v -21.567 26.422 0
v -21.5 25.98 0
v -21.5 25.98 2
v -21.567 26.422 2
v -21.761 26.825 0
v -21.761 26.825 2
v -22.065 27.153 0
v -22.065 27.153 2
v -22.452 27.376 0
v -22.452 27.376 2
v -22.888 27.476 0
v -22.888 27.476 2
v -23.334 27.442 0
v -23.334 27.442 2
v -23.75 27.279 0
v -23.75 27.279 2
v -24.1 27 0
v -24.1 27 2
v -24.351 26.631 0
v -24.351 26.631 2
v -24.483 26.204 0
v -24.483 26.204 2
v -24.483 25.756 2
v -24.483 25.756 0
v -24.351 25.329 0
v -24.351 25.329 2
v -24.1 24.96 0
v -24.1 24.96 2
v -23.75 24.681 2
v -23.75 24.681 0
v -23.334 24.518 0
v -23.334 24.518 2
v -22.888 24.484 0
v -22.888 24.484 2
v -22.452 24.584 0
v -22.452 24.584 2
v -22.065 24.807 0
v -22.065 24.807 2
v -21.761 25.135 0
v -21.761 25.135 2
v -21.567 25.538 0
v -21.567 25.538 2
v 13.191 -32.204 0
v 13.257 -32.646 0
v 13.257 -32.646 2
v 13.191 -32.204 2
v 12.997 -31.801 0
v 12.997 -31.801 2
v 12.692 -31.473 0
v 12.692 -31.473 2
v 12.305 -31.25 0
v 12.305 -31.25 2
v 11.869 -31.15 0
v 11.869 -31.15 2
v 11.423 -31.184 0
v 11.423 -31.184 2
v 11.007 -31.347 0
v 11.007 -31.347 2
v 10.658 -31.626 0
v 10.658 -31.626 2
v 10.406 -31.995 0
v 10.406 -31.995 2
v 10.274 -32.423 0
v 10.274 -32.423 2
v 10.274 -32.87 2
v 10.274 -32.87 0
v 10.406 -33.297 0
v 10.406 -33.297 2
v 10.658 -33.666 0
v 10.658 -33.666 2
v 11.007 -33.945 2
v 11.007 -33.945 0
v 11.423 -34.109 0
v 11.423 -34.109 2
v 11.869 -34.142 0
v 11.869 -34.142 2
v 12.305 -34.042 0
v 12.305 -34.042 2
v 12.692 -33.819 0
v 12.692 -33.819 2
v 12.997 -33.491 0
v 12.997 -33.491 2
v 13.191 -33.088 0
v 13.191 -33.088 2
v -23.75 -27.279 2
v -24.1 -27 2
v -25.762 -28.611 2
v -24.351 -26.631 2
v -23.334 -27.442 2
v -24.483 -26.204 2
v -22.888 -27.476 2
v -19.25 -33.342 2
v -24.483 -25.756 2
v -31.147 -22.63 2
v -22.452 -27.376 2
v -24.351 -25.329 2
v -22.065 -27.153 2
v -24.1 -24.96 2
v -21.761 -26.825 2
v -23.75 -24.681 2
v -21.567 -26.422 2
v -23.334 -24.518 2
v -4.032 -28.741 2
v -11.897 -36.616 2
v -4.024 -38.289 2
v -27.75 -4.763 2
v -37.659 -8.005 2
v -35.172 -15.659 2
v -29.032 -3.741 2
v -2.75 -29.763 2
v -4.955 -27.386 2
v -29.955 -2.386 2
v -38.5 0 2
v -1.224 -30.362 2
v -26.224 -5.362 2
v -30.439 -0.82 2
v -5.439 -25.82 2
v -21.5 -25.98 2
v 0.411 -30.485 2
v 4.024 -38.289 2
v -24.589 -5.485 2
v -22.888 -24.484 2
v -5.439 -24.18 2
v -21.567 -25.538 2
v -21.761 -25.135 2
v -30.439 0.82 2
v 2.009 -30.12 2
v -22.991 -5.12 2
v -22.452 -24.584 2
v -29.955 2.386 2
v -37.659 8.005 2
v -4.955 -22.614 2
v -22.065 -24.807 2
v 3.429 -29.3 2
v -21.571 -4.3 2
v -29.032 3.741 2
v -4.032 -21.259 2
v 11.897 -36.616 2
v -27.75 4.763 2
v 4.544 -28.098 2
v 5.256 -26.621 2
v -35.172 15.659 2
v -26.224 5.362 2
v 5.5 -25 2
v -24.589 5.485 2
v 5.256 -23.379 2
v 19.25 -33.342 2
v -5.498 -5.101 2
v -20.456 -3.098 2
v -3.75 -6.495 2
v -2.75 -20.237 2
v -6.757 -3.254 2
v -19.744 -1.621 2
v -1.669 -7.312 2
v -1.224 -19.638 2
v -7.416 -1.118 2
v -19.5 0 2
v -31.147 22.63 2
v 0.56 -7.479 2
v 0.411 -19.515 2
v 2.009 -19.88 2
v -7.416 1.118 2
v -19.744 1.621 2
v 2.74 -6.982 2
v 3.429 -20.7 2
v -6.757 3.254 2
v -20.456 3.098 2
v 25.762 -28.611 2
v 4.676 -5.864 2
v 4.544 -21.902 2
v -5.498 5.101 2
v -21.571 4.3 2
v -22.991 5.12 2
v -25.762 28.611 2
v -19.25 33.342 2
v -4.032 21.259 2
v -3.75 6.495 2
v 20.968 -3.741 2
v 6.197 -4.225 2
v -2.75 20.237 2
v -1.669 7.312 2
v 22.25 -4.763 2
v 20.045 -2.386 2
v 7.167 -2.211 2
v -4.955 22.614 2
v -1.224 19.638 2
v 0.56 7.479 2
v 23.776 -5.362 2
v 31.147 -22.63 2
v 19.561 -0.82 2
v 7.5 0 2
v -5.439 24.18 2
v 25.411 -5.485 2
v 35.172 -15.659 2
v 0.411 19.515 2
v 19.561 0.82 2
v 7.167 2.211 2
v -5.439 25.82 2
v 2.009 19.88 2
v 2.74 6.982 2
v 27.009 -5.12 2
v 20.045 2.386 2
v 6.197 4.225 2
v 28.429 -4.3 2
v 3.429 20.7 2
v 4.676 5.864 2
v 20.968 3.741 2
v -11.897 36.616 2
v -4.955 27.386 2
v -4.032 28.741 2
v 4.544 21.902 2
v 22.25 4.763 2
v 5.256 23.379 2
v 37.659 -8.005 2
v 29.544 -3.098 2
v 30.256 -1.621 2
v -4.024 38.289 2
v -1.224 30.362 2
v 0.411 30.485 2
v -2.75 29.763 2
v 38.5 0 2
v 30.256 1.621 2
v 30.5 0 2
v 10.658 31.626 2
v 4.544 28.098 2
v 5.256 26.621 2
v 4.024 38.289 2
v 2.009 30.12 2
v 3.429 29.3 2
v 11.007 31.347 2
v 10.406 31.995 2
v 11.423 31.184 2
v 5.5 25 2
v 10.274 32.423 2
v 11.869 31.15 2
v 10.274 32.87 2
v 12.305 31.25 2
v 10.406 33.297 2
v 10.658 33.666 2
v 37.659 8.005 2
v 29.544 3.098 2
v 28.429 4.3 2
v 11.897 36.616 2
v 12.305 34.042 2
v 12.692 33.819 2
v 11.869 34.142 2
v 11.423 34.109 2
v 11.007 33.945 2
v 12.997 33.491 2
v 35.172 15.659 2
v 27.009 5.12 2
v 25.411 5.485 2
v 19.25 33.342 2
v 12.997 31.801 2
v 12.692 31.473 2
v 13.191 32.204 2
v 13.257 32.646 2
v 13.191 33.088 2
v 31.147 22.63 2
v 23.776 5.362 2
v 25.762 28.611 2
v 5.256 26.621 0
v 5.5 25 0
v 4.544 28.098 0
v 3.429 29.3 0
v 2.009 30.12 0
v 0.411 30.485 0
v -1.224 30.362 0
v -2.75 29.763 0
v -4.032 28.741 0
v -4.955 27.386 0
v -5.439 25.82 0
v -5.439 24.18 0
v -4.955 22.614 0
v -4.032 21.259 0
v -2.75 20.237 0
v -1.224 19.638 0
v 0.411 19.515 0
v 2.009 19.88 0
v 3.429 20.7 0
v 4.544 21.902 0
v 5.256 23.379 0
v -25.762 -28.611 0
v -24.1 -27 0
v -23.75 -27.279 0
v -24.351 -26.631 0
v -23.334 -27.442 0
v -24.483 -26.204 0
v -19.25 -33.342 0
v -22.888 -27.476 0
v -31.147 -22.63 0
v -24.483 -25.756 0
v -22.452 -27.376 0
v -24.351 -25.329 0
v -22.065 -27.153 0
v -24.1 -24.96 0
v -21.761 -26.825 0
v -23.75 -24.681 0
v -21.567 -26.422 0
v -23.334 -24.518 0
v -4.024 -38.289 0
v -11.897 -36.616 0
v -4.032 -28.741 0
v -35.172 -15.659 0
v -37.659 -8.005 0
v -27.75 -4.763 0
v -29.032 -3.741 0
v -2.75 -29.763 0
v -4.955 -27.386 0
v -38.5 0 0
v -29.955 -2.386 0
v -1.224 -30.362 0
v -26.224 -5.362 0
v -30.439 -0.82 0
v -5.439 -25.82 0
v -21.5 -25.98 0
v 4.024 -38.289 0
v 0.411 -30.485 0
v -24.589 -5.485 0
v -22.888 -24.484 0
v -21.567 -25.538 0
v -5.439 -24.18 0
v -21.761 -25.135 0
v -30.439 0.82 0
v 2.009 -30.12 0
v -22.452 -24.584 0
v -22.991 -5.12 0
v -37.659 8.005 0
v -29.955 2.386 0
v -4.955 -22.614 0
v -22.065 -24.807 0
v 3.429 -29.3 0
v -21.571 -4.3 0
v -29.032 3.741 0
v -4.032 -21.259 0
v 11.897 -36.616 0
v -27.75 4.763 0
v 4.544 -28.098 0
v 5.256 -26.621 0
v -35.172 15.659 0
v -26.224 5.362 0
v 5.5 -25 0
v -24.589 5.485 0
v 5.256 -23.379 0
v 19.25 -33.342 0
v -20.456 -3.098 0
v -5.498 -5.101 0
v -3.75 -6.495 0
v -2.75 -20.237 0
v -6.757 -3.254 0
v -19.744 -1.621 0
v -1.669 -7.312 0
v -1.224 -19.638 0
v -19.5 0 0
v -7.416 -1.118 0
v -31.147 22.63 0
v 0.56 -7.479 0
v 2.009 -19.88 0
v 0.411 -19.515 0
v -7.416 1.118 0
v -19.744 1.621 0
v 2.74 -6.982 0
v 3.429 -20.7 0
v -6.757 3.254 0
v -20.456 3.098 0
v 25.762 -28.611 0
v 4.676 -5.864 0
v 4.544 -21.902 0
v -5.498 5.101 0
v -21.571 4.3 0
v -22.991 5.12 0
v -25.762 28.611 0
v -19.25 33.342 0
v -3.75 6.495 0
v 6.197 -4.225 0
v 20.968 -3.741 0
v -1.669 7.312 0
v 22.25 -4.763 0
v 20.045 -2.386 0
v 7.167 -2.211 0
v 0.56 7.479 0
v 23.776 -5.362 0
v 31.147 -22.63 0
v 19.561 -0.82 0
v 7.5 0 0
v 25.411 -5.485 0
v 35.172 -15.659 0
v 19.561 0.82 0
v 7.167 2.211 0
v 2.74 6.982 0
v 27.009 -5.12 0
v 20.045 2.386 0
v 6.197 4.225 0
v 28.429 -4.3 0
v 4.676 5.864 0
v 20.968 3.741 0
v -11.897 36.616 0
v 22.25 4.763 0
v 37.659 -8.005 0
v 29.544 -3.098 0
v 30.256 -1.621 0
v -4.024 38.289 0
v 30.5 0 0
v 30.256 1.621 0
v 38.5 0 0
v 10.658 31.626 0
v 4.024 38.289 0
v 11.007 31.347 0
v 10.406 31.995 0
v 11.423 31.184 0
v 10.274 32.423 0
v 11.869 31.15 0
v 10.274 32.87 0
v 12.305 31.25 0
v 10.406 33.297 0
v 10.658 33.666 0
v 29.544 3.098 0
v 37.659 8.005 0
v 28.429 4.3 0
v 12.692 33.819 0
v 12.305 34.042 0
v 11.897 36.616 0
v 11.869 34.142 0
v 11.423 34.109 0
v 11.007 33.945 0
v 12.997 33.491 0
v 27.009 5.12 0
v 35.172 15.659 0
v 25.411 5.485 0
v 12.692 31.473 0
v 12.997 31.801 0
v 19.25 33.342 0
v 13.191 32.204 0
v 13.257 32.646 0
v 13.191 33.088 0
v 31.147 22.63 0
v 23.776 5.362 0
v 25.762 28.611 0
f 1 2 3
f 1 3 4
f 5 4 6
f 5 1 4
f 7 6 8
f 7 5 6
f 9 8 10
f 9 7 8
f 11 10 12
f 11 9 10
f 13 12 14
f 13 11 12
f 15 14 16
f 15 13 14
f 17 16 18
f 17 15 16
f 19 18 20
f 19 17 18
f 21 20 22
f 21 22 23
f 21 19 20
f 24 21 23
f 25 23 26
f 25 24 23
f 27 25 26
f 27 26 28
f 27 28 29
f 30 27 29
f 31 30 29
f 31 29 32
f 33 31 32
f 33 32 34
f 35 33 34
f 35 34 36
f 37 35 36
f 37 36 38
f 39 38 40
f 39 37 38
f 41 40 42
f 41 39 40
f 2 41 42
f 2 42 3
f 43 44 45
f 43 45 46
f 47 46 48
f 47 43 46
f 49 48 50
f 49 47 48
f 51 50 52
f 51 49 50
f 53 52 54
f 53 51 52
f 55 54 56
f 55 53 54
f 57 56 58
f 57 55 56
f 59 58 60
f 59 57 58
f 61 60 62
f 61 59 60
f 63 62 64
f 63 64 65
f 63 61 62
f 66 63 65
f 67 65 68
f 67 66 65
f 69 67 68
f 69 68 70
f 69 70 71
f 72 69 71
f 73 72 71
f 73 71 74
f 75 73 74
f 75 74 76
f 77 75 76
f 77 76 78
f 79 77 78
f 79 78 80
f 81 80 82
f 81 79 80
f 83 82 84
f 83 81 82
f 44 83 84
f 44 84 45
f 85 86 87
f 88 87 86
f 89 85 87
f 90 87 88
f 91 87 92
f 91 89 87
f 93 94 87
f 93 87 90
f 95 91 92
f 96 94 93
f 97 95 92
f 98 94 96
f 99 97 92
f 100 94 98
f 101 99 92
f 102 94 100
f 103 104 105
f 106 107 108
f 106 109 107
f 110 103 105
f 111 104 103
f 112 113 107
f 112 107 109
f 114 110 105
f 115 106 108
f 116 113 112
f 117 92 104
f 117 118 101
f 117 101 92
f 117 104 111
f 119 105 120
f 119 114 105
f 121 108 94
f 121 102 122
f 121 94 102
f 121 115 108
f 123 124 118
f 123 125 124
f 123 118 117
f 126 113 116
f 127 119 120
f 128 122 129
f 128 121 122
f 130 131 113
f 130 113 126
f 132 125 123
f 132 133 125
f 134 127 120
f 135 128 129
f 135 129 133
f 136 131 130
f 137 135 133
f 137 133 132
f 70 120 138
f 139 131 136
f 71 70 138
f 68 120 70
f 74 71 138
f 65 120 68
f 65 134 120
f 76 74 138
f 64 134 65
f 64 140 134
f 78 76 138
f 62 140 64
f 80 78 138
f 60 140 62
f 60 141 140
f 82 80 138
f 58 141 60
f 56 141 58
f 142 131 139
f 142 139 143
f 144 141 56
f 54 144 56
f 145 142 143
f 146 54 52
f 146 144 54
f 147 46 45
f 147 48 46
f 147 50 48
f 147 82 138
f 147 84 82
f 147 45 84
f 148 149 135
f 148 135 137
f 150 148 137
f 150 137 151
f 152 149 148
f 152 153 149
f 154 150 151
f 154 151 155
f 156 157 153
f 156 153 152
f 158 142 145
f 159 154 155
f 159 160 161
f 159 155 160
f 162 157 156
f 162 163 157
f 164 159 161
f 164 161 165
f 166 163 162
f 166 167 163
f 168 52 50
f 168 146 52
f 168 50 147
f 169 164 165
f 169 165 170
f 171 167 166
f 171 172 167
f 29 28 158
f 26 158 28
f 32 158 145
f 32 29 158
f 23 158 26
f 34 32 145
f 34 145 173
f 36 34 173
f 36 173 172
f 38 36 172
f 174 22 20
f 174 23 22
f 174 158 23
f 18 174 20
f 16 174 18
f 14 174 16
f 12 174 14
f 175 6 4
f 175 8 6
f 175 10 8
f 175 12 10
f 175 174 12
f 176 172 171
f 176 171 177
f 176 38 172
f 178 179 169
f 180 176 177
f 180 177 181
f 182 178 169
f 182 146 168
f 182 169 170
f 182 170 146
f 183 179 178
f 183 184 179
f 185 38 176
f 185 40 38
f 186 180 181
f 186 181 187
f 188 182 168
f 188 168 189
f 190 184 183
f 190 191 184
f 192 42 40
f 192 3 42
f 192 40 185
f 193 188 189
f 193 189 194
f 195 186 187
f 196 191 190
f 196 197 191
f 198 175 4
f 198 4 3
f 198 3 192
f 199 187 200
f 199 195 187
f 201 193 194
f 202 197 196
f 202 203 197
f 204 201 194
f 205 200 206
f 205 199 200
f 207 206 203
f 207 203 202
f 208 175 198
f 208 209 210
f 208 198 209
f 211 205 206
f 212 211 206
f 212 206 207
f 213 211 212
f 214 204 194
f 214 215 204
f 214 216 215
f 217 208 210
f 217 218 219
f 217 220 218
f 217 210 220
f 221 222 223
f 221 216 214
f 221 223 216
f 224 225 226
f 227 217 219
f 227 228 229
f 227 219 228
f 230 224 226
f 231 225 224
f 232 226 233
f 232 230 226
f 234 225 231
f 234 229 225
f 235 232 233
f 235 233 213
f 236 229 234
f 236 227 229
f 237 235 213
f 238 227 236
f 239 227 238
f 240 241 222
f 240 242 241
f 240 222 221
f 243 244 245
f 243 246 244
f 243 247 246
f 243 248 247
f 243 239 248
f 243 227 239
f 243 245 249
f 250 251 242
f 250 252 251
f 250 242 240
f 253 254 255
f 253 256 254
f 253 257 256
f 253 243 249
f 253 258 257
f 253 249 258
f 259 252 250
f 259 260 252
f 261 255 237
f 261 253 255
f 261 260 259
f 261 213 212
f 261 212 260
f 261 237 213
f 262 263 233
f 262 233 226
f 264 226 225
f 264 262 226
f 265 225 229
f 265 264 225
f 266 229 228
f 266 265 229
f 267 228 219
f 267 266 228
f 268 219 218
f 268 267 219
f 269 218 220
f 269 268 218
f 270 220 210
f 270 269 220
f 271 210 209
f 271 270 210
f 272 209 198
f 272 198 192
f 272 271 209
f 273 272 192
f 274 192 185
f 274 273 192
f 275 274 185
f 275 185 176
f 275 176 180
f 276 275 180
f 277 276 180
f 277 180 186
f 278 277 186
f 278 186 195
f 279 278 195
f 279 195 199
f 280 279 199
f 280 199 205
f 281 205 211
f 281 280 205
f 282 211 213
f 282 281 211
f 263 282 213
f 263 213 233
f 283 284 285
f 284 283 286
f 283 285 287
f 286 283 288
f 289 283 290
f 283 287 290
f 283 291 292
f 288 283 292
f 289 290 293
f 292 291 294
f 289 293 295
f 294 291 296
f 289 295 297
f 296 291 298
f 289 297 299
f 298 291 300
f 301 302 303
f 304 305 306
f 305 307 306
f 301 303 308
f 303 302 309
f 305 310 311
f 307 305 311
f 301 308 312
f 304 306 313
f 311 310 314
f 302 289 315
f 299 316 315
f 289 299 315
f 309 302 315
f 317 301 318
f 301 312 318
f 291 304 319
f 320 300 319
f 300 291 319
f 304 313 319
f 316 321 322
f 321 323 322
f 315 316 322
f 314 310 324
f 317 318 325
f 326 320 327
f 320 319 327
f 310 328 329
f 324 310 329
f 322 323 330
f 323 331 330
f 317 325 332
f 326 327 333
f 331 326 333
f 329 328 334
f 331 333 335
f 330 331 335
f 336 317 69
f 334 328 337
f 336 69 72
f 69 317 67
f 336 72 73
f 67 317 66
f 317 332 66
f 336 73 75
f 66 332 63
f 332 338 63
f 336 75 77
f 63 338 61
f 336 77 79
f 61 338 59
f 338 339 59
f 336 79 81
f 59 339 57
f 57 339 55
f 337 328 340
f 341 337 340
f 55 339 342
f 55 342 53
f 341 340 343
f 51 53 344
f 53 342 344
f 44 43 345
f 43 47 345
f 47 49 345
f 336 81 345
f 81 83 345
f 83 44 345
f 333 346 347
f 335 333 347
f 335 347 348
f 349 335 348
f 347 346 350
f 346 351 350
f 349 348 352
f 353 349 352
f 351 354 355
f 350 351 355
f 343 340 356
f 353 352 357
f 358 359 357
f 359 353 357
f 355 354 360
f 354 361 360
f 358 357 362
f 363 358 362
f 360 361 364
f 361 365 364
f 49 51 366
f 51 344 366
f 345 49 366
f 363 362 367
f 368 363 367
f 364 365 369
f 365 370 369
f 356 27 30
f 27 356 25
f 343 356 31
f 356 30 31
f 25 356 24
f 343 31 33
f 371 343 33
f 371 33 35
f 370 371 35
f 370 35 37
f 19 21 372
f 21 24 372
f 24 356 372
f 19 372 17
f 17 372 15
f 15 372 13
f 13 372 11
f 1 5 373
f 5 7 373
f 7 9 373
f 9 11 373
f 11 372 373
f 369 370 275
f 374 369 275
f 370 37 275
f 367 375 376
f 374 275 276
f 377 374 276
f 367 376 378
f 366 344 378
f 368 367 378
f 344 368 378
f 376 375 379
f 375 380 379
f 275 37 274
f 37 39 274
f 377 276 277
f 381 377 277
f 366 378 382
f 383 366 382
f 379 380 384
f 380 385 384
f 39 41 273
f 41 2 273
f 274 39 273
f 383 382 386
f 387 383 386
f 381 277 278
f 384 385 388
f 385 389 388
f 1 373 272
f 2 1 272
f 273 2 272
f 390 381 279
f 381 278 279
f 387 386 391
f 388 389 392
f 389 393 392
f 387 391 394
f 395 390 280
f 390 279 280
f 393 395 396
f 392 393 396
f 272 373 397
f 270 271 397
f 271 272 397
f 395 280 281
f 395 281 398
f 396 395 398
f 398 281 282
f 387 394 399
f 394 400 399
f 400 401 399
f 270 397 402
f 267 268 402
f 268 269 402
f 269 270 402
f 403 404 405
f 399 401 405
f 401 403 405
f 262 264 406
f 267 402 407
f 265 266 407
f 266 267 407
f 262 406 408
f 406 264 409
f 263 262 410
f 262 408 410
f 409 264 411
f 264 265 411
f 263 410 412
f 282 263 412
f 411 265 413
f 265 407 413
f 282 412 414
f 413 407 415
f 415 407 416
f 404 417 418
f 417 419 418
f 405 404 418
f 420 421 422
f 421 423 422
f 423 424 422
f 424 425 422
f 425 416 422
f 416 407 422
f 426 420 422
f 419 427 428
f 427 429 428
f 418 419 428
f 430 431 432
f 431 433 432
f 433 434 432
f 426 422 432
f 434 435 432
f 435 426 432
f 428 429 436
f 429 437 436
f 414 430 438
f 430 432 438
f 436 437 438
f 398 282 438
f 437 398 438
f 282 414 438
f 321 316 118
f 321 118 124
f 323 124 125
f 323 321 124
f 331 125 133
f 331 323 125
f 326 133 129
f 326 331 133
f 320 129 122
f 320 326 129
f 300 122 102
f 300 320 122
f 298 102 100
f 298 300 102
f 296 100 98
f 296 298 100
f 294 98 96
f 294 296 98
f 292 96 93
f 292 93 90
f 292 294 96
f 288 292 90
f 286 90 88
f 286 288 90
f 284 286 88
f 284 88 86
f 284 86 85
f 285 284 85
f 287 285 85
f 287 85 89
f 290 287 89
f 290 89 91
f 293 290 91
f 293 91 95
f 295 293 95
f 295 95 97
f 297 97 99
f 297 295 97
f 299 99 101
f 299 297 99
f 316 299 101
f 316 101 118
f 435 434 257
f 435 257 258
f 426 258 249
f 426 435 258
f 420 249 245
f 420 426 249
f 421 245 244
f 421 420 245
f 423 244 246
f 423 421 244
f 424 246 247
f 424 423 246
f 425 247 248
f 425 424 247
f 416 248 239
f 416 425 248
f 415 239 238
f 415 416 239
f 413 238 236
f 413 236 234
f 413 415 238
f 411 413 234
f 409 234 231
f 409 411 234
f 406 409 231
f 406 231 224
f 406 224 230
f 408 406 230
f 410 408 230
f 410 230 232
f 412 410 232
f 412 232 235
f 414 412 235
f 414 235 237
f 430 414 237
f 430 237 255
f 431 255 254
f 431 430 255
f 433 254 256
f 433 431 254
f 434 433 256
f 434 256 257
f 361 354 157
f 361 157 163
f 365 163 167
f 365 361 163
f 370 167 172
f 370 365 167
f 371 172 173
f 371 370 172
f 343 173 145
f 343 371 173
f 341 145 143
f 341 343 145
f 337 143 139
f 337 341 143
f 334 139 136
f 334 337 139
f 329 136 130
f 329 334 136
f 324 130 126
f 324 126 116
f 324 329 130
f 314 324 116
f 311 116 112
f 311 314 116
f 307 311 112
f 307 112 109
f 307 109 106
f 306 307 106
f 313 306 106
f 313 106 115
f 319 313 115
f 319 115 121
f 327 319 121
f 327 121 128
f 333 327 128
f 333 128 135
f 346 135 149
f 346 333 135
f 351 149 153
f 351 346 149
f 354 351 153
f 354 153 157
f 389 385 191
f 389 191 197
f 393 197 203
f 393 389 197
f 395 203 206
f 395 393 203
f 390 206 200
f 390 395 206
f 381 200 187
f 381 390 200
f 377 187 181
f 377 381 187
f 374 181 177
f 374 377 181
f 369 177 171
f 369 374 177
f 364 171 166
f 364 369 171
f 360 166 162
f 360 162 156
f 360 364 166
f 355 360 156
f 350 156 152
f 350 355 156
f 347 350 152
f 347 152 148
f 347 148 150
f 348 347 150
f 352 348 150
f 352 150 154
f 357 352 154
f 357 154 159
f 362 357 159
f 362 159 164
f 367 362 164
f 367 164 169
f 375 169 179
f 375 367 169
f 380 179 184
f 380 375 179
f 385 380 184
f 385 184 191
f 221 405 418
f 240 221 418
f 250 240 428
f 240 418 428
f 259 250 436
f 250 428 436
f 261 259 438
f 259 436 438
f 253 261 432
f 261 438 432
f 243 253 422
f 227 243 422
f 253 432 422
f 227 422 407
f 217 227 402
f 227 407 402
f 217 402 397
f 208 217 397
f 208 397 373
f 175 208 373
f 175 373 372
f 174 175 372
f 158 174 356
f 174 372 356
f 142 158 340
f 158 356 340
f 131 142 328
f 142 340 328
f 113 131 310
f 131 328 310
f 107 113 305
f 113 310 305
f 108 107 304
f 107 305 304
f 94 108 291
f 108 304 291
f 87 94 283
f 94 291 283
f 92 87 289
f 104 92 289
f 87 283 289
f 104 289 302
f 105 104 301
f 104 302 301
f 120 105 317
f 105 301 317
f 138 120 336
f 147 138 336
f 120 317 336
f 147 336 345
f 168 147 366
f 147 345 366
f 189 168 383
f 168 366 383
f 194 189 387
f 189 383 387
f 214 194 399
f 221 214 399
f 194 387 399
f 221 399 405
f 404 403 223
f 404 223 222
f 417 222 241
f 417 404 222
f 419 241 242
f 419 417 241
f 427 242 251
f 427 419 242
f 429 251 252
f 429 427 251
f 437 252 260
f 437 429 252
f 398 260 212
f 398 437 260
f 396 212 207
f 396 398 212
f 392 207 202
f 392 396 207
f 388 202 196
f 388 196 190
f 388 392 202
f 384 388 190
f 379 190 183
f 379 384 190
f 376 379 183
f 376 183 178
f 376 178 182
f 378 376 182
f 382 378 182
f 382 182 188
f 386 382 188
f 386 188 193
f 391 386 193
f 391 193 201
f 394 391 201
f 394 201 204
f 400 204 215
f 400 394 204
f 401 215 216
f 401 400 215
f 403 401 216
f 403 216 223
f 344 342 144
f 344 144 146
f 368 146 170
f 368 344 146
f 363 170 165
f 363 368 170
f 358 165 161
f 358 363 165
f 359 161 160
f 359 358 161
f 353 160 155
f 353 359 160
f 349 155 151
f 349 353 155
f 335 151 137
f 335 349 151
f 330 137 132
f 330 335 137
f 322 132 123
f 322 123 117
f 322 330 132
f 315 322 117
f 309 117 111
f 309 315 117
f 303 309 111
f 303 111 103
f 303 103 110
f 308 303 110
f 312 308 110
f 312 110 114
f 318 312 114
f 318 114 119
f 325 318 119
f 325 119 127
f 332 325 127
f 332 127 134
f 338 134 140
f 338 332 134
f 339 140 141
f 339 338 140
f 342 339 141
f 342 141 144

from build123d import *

# Parameters (mm, degrees)
MODEL_R             = 38.5
MODEL_R_2           = 1.5
MODEL_R_3           = 5.5
MODEL_R_4           = 7.5
BOSS_EXTRUDE1_DEPTH = 2


with BuildPart() as part:
    # Model → Boss-Extrude1 (new body)
    with BuildSketch(Plane.XY):
        Circle(MODEL_R)
        with Locations((-23, 25.98)):
            Circle(MODEL_R_2, mode=Mode.SUBTRACT)
        with Locations((11.757144545, -32.646126143)):
            Circle(MODEL_R_2, mode=Mode.SUBTRACT)
        with Locations((11.757144545, 32.646126143)):
            Circle(MODEL_R_2, mode=Mode.SUBTRACT)
        with Locations((-23, -25.98)):
            Circle(MODEL_R_2, mode=Mode.SUBTRACT)
        with Locations((-25, 0)):
            Circle(MODEL_R_3, mode=Mode.SUBTRACT)
        with Locations((0, 25)):
            Circle(MODEL_R_3, mode=Mode.SUBTRACT)
        with Locations((0, -25)):
            Circle(MODEL_R_3, mode=Mode.SUBTRACT)
        with Locations((25, 0)):
            Circle(MODEL_R_3, mode=Mode.SUBTRACT)
        Circle(MODEL_R_4, mode=Mode.SUBTRACT)
    extrude(amount=BOSS_EXTRUDE1_DEPTH)


solid = part.part
